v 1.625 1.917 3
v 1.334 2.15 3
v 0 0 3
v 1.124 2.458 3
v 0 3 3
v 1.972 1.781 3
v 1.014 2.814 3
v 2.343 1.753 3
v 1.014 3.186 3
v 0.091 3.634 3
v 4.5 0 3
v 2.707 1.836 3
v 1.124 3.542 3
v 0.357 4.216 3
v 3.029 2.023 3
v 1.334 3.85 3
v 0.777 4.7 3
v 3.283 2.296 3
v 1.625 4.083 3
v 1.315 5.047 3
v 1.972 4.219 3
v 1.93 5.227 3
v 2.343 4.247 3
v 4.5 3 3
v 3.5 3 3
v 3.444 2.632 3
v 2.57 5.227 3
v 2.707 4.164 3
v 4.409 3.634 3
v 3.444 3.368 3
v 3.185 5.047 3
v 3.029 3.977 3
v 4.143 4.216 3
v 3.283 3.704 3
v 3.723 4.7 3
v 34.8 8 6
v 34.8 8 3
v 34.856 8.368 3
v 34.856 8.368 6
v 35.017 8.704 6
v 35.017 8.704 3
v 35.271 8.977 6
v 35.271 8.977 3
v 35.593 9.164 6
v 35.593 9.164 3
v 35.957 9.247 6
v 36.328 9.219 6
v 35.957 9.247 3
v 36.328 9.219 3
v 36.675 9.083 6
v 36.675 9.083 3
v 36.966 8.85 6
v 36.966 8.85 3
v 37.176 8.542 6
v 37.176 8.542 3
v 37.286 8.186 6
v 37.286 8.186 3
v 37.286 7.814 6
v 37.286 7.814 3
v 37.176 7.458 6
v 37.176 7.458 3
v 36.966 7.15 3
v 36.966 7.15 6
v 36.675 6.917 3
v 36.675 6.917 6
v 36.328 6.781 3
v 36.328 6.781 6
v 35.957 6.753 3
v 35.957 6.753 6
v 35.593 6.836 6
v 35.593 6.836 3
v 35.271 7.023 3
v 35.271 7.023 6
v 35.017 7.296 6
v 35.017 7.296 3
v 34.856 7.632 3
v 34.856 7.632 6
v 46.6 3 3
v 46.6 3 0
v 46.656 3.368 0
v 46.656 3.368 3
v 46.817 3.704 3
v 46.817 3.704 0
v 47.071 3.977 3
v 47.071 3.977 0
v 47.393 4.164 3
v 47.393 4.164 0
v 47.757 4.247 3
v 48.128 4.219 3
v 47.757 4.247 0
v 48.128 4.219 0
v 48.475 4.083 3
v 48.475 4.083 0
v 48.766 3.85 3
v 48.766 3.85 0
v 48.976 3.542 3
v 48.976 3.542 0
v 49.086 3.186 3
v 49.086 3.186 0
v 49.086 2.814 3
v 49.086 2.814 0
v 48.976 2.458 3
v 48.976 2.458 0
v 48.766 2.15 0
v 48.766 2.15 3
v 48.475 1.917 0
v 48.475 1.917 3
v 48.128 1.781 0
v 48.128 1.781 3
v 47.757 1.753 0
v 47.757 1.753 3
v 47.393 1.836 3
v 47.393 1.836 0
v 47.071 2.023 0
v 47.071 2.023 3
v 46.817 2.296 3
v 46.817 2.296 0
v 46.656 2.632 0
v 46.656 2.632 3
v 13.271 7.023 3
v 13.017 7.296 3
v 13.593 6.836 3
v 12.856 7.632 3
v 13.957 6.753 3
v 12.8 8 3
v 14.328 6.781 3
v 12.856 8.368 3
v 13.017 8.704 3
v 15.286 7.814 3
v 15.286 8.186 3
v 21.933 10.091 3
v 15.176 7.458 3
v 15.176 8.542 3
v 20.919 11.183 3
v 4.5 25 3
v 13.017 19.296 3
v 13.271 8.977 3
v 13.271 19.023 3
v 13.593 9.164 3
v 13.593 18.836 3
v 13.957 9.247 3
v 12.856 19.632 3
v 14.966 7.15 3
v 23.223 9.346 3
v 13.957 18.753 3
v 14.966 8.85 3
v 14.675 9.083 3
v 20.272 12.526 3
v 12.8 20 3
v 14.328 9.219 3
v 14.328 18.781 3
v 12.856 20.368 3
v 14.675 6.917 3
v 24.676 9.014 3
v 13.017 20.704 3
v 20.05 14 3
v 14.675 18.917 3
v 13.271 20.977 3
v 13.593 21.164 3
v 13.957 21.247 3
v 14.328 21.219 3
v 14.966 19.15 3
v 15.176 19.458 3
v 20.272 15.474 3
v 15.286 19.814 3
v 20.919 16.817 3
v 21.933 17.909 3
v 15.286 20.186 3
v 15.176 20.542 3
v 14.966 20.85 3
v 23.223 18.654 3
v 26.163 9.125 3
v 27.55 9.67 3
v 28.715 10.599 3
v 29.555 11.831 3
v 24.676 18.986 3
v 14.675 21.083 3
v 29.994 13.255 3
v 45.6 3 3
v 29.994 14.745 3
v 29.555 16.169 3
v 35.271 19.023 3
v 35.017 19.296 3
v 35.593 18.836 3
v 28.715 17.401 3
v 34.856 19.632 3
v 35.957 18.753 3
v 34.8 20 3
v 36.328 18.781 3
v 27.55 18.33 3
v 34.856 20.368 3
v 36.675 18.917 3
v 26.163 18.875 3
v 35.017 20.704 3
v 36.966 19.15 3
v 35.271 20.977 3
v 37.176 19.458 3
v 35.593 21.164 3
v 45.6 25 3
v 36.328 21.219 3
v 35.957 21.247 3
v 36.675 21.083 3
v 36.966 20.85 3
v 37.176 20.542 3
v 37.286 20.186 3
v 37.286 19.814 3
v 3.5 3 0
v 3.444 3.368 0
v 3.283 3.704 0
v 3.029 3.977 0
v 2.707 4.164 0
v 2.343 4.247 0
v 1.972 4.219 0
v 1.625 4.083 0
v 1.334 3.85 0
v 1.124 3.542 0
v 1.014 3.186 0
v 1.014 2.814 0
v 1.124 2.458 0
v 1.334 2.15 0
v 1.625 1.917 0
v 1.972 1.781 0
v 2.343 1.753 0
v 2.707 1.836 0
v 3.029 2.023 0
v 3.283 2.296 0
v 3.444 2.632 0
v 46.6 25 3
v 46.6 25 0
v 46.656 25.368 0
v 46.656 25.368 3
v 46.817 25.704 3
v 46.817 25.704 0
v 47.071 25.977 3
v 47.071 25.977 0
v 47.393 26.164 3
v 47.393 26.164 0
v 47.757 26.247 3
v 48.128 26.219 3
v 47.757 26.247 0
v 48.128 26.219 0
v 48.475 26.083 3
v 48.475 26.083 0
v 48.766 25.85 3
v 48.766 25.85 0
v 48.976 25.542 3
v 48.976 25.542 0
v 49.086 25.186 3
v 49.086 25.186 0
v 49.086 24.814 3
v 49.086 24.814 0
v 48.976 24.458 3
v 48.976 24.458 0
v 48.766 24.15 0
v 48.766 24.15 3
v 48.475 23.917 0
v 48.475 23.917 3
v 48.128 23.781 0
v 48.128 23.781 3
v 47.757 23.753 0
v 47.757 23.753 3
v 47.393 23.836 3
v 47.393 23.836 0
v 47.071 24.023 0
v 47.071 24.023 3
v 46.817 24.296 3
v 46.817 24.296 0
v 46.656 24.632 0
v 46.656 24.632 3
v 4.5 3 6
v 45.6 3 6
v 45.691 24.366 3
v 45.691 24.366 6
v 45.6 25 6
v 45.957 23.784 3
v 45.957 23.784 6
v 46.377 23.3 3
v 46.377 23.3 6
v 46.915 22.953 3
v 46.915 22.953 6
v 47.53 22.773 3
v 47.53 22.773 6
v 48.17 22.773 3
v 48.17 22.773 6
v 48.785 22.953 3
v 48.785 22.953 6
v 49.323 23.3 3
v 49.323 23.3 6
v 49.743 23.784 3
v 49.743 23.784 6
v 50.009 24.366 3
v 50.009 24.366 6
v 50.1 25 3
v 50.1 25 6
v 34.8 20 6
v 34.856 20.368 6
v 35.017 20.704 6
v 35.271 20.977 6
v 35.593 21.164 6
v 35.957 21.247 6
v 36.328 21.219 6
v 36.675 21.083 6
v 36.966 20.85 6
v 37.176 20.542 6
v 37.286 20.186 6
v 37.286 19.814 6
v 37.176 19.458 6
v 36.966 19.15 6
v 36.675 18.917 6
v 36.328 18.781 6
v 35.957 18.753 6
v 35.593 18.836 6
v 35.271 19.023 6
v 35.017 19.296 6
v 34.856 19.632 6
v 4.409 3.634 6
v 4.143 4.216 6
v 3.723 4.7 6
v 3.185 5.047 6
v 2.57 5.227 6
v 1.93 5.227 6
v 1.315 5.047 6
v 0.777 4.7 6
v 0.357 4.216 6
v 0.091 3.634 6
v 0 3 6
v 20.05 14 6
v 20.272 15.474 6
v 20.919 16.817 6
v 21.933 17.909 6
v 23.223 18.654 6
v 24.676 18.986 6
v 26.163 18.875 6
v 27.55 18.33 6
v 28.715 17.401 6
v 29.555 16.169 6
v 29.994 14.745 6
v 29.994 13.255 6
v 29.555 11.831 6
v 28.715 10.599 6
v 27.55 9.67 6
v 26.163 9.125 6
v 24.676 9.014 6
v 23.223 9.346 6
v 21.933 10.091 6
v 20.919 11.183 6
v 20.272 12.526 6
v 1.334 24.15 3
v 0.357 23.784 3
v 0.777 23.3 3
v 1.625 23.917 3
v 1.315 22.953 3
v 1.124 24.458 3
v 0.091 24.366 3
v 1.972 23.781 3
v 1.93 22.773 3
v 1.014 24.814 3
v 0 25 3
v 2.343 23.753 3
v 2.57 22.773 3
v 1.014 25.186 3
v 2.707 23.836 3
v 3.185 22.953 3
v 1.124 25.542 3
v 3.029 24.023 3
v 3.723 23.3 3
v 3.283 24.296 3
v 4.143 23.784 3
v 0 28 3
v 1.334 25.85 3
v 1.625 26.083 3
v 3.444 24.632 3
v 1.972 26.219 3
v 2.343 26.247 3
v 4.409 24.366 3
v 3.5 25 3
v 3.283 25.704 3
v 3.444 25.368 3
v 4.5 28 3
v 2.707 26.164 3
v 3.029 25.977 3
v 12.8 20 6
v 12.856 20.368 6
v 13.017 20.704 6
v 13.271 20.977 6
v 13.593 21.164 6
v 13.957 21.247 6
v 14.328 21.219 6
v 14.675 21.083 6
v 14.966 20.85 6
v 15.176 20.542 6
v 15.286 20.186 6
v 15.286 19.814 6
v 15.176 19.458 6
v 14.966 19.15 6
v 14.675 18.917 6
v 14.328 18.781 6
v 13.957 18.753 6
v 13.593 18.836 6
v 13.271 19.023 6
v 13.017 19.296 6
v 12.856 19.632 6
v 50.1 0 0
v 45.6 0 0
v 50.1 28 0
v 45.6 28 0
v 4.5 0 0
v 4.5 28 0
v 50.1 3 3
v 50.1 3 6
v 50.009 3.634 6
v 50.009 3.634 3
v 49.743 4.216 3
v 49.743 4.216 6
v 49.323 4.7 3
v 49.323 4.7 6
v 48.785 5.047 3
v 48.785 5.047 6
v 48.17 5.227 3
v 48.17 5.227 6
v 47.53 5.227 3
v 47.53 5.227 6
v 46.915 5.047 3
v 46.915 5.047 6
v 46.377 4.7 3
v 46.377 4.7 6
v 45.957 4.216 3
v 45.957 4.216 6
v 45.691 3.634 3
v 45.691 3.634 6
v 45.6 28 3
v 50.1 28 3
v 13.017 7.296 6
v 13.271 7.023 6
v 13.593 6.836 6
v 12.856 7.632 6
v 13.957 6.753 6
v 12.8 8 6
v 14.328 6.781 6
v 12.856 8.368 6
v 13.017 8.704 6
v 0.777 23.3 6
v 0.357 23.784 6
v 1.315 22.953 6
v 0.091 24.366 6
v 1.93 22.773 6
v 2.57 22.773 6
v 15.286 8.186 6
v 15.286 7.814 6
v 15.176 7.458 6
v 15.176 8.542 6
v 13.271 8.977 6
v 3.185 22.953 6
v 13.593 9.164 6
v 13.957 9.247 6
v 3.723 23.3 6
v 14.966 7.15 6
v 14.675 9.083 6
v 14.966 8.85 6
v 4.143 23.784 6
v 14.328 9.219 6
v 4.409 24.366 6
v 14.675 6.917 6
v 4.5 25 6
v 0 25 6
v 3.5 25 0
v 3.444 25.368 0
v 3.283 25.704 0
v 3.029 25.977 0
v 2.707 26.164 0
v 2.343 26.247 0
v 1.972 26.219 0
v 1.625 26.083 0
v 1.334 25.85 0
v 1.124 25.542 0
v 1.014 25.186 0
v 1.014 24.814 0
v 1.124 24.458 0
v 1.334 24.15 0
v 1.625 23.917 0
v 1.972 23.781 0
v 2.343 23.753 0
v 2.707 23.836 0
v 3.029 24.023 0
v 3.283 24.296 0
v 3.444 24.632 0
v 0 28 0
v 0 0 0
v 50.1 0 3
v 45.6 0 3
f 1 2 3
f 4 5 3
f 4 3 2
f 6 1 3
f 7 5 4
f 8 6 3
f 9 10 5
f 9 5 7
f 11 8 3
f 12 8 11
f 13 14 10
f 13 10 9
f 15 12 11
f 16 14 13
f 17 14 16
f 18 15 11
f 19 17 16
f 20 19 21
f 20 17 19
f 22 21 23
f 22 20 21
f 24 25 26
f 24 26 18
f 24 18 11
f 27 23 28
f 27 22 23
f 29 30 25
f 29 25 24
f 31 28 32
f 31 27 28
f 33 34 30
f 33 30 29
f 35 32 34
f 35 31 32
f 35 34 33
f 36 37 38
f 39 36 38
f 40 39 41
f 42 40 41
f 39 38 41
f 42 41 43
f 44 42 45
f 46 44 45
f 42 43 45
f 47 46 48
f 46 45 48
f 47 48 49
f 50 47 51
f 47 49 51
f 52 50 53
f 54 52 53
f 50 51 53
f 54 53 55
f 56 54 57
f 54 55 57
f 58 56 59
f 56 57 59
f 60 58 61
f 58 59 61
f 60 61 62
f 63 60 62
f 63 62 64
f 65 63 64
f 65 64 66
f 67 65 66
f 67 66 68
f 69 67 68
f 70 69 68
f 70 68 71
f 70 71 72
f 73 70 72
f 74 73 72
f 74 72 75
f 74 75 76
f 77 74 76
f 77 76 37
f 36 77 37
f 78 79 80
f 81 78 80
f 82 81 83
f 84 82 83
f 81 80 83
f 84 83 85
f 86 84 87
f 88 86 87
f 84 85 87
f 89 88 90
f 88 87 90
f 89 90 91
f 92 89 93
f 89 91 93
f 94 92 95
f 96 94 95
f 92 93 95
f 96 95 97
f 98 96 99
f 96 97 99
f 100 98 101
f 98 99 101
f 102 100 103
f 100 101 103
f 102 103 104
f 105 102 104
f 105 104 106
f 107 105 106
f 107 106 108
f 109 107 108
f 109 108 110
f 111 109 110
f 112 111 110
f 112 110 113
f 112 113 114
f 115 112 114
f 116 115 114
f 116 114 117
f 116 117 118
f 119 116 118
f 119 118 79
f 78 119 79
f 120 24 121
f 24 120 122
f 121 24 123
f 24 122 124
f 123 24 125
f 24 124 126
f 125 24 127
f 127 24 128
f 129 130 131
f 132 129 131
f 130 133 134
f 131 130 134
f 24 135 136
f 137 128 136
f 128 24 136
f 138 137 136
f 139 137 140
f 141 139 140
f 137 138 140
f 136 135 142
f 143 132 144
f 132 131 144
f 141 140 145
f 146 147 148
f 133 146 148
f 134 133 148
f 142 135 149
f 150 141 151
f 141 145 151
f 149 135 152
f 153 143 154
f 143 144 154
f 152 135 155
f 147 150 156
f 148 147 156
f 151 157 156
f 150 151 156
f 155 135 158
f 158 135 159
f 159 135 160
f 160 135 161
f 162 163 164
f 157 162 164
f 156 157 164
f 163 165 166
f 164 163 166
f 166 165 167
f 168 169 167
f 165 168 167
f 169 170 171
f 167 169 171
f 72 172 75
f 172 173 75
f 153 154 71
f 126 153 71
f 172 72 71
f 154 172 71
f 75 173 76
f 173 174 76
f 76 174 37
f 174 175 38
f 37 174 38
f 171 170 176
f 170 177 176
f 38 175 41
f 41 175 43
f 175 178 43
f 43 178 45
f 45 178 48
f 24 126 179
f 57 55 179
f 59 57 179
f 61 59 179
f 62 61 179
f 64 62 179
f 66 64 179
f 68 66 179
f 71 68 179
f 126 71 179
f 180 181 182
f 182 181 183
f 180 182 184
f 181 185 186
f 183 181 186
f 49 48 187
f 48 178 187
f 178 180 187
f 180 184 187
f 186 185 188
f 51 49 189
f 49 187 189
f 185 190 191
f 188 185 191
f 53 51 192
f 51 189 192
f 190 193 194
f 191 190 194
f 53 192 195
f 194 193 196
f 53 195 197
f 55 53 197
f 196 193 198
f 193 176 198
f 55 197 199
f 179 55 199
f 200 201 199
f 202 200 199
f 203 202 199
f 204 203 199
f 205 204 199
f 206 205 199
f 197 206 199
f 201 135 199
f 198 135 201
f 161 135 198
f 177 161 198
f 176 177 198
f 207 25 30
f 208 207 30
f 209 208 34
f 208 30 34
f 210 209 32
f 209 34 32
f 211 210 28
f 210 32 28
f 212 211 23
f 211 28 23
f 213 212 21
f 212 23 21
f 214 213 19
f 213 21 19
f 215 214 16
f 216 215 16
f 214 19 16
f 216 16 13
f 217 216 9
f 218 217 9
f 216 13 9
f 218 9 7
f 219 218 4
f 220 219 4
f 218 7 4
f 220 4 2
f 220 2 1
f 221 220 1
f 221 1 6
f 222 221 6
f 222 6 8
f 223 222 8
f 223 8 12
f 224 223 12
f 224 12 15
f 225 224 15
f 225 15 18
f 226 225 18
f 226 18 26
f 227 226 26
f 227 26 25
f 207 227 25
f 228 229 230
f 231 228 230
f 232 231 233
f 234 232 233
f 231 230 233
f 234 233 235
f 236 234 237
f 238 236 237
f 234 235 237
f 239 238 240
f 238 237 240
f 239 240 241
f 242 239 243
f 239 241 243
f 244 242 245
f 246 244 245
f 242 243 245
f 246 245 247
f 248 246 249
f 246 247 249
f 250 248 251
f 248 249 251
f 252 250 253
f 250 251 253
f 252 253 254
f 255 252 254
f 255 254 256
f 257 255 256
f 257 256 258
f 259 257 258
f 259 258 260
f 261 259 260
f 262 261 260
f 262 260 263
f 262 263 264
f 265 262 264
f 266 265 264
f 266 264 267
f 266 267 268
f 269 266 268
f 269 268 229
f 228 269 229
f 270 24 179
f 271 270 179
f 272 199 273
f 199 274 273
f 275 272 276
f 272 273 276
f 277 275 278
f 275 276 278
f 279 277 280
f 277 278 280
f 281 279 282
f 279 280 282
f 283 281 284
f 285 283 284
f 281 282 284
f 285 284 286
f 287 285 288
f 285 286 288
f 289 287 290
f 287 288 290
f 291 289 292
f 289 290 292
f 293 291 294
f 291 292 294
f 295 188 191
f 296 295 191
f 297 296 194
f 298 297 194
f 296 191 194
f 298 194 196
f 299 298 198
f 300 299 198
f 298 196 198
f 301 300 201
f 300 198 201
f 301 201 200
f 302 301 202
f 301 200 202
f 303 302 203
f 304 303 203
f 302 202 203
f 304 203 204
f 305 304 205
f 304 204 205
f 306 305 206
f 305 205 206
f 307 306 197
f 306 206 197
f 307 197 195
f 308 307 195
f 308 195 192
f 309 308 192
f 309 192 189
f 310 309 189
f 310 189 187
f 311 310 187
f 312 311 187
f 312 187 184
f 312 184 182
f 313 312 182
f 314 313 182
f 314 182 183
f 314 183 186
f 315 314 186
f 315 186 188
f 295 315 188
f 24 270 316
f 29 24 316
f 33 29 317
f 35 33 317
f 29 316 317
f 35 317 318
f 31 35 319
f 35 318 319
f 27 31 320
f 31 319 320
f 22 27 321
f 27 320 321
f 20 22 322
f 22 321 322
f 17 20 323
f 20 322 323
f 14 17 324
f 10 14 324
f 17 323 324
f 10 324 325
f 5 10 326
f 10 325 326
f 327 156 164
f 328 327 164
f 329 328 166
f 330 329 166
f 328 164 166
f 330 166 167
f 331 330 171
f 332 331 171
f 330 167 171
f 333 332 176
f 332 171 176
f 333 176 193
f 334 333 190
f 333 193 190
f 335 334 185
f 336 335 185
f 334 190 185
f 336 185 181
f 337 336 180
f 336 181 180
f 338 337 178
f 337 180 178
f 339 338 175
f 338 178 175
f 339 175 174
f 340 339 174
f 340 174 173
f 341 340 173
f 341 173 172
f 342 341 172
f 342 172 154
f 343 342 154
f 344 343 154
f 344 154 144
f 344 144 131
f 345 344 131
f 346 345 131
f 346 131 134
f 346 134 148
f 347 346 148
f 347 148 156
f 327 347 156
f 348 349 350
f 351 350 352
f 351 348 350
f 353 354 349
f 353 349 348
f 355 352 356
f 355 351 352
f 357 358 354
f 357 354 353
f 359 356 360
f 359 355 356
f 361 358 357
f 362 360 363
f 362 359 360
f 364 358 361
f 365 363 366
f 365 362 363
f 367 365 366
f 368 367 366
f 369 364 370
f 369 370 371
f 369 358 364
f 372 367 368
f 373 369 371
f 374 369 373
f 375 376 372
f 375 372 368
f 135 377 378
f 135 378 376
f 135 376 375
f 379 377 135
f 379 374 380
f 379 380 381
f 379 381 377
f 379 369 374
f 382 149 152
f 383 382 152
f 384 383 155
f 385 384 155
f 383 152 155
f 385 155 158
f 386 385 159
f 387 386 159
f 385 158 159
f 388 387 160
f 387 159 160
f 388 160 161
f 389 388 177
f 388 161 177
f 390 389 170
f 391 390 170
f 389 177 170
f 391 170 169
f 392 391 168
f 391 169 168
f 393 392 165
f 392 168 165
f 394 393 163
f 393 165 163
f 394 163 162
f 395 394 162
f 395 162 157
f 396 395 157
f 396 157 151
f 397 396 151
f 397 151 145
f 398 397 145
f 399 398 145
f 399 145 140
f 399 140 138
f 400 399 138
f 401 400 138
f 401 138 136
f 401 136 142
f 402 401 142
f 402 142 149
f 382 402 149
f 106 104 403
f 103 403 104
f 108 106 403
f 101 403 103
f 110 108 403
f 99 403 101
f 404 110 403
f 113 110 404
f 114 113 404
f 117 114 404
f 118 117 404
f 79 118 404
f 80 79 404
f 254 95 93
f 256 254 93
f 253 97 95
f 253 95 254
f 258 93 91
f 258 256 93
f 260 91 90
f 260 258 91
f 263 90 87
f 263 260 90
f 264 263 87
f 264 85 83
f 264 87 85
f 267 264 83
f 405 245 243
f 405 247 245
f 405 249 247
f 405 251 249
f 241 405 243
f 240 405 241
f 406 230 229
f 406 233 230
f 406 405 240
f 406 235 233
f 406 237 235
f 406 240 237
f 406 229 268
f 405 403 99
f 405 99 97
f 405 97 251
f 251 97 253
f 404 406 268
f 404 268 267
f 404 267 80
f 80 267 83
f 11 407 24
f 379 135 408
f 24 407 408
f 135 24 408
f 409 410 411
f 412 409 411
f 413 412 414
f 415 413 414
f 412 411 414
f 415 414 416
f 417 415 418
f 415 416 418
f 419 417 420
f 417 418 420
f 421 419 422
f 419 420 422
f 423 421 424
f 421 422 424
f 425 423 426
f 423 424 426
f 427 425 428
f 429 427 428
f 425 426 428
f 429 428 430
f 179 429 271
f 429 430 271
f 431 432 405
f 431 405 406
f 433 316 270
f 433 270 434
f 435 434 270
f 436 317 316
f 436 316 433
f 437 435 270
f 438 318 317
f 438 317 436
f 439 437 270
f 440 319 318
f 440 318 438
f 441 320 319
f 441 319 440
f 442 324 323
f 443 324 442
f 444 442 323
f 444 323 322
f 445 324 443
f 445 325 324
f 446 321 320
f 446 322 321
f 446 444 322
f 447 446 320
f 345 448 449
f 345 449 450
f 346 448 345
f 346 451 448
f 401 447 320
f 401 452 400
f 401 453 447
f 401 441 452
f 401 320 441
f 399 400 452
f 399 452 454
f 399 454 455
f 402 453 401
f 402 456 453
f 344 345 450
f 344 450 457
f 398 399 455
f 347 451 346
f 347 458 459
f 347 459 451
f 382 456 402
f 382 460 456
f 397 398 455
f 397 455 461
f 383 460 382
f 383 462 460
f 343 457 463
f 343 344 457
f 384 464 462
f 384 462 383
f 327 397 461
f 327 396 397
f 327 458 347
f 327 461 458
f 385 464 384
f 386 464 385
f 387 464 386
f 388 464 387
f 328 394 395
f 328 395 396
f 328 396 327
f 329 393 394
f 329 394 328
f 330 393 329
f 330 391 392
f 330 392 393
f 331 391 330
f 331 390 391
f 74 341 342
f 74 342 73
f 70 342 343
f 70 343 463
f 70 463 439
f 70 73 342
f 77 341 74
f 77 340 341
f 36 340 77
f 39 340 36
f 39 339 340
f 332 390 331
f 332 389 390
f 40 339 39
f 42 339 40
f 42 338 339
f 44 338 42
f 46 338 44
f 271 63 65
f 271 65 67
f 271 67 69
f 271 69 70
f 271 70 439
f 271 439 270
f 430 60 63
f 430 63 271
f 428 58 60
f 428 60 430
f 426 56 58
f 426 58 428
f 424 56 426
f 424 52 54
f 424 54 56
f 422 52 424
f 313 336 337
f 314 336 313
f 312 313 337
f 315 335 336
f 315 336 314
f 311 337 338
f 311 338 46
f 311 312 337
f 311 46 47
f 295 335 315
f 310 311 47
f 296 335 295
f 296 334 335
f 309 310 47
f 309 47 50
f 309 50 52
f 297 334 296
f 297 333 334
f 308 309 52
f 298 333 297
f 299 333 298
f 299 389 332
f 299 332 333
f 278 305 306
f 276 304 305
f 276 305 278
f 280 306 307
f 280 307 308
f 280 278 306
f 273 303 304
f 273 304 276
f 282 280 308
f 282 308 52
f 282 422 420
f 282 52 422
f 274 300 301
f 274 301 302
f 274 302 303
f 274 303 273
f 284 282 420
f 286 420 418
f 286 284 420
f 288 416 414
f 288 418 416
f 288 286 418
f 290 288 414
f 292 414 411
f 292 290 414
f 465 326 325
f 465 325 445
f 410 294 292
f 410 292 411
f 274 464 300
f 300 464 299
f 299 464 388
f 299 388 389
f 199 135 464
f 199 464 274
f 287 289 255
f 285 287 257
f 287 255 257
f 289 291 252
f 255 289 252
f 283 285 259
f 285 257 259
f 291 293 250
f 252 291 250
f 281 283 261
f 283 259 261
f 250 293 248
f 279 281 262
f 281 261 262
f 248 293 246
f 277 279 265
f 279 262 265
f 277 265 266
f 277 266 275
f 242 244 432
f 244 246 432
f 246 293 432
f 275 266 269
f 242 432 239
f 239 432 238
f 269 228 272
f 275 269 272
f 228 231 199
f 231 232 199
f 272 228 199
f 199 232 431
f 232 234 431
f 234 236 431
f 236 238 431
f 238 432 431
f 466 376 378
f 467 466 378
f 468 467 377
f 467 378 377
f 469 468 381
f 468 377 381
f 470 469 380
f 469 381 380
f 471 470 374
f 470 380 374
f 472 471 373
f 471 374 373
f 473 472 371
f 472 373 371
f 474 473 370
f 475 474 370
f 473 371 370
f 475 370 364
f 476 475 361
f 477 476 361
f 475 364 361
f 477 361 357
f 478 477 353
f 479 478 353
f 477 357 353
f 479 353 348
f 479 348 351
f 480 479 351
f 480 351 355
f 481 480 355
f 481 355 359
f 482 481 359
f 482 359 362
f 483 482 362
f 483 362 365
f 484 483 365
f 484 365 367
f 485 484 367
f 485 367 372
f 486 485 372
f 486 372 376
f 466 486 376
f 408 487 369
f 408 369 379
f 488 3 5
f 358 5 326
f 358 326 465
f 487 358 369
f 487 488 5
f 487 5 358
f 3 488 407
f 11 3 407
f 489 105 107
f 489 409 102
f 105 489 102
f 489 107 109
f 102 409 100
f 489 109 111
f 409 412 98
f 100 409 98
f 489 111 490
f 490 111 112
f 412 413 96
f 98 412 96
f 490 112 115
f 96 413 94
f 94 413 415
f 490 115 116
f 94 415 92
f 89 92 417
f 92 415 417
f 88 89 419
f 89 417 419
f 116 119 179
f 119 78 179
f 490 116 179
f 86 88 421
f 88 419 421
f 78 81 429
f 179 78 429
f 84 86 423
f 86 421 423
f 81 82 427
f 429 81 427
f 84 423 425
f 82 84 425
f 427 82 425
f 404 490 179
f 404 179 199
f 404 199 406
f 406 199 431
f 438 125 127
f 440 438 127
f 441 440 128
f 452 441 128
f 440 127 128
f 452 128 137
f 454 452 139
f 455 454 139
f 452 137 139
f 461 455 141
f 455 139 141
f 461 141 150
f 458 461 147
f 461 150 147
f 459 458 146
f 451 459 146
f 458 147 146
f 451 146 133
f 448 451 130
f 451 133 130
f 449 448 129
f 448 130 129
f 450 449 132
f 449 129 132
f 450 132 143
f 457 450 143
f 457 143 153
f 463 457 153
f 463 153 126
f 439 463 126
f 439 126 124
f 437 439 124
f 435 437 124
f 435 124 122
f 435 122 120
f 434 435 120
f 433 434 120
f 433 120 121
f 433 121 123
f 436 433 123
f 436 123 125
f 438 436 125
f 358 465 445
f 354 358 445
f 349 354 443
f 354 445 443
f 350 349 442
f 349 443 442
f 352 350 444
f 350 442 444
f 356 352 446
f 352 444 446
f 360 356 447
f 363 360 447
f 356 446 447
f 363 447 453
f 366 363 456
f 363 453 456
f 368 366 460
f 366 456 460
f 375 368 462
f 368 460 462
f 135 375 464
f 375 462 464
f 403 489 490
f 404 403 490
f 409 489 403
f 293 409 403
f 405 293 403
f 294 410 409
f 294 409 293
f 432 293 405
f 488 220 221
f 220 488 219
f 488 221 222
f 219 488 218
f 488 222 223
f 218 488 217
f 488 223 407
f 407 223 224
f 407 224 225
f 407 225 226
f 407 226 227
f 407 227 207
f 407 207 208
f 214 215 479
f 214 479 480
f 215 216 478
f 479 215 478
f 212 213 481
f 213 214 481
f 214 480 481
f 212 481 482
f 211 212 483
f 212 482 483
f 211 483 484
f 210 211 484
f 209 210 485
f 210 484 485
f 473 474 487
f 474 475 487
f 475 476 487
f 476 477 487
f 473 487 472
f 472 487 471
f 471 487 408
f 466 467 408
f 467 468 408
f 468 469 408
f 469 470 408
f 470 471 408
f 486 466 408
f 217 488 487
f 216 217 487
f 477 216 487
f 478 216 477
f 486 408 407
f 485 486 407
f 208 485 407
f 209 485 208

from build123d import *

# Parameters (mm, degrees)
SKETCH_1_W          = 4.5
SKETCH_1_H          = 28
EXTRUDE_1_DEPTH     = 3
SKETCH_4_W          = 50.1
SKETCH_4_H          = 22
EXTRUDE_2_DEPTH     = 3
SKETCH_5_W          = 4.5
SKETCH_5_H          = 28
EXTRUDE_3_DEPTH     = 3
SKETCH_6_R          = 1.25
CUT_EXTRUDE_2_DEPTH = 7
SKETCH_2_R          = 1.25
CUT_EXTRUDE_1_DEPTH = 4
SKETCH_7_R          = 5
SKETCH_7_R_2        = 1.25
CUT_EXTRUDE_3_DEPTH = 4
SKETCH_10_R         = 2.25
CUT_EXTRUDE_4_DEPTH = 3


with BuildPart() as part:
    # 스케치1 → 보스-돌출1 (new body)
    with BuildSketch(Plane.XY):
        with Locations((2.25, 14)):
            Rectangle(SKETCH_1_W, SKETCH_1_H)
    extrude(amount=EXTRUDE_1_DEPTH)

    # 스케치4 → 보스-돌출2 (add)
    with BuildSketch(Plane.XY.offset(3)):
        with Locations((25.05, 14)):
            Rectangle(SKETCH_4_W, SKETCH_4_H)
    extrude(amount=EXTRUDE_2_DEPTH)

    # 스케치5 → 보스-돌출3 (add)
    with BuildSketch(Plane(origin=(0, 0, 3), x_dir=(-1, 0, 0), z_dir=(0, 0, -1))):
        with Locations((-47.85, 14)):
            Rectangle(SKETCH_5_W, SKETCH_5_H)
    extrude(amount=EXTRUDE_3_DEPTH)

    # 스케치6 → 컷-돌출2 (cut, through all)
    with BuildSketch(Plane(origin=(0, 0, 0), x_dir=(-1, 0, 0), z_dir=(0, 0, -1))):
        with Locations((-47.85, 25)):
            Circle(SKETCH_6_R)
        with Locations((-47.85, 3)):
            Circle(SKETCH_6_R)
    extrude(amount=-CUT_EXTRUDE_2_DEPTH, mode=Mode.SUBTRACT)

    # 스케치2 → 컷-돌출1 (cut, through all)
    with BuildSketch(Plane.XY.offset(3)):
        with Locations((2.25, 25)):
            Circle(SKETCH_2_R)
        with Locations((2.25, 3)):
            Circle(SKETCH_2_R)
    extrude(amount=-CUT_EXTRUDE_1_DEPTH, mode=Mode.SUBTRACT)

    # 스케치7 → 컷-돌출3 (cut, through all)
    with BuildSketch(Plane(origin=(0, 0, 3), x_dir=(-1, 0, 0), z_dir=(0, 0, -1))):
        with Locations((-25.05, 14)):
            Circle(SKETCH_7_R)
        with Locations((-36.05, 20)):
            Circle(SKETCH_7_R_2)
        with Locations((-14.05, 20)):
            Circle(SKETCH_7_R_2)
        with Locations((-36.05, 8)):
            Circle(SKETCH_7_R_2)
        with Locations((-14.05, 8)):
            Circle(SKETCH_7_R_2)
    extrude(amount=-CUT_EXTRUDE_3_DEPTH, mode=Mode.SUBTRACT)

    # 스케치10 → 컷-돌출4 (cut)
    with BuildSketch(Plane.XY.offset(6)):
        with Locations((2.25, 25)):
            Circle(SKETCH_10_R)
        with Locations((2.25, 3)):
            Circle(SKETCH_10_R)
        with Locations((47.85, 25)):
            Circle(SKETCH_10_R)
        with Locations((47.85, 3)):
            Circle(SKETCH_10_R)
    extrude(amount=-CUT_EXTRUDE_4_DEPTH, mode=Mode.SUBTRACT)


solid = part.part
